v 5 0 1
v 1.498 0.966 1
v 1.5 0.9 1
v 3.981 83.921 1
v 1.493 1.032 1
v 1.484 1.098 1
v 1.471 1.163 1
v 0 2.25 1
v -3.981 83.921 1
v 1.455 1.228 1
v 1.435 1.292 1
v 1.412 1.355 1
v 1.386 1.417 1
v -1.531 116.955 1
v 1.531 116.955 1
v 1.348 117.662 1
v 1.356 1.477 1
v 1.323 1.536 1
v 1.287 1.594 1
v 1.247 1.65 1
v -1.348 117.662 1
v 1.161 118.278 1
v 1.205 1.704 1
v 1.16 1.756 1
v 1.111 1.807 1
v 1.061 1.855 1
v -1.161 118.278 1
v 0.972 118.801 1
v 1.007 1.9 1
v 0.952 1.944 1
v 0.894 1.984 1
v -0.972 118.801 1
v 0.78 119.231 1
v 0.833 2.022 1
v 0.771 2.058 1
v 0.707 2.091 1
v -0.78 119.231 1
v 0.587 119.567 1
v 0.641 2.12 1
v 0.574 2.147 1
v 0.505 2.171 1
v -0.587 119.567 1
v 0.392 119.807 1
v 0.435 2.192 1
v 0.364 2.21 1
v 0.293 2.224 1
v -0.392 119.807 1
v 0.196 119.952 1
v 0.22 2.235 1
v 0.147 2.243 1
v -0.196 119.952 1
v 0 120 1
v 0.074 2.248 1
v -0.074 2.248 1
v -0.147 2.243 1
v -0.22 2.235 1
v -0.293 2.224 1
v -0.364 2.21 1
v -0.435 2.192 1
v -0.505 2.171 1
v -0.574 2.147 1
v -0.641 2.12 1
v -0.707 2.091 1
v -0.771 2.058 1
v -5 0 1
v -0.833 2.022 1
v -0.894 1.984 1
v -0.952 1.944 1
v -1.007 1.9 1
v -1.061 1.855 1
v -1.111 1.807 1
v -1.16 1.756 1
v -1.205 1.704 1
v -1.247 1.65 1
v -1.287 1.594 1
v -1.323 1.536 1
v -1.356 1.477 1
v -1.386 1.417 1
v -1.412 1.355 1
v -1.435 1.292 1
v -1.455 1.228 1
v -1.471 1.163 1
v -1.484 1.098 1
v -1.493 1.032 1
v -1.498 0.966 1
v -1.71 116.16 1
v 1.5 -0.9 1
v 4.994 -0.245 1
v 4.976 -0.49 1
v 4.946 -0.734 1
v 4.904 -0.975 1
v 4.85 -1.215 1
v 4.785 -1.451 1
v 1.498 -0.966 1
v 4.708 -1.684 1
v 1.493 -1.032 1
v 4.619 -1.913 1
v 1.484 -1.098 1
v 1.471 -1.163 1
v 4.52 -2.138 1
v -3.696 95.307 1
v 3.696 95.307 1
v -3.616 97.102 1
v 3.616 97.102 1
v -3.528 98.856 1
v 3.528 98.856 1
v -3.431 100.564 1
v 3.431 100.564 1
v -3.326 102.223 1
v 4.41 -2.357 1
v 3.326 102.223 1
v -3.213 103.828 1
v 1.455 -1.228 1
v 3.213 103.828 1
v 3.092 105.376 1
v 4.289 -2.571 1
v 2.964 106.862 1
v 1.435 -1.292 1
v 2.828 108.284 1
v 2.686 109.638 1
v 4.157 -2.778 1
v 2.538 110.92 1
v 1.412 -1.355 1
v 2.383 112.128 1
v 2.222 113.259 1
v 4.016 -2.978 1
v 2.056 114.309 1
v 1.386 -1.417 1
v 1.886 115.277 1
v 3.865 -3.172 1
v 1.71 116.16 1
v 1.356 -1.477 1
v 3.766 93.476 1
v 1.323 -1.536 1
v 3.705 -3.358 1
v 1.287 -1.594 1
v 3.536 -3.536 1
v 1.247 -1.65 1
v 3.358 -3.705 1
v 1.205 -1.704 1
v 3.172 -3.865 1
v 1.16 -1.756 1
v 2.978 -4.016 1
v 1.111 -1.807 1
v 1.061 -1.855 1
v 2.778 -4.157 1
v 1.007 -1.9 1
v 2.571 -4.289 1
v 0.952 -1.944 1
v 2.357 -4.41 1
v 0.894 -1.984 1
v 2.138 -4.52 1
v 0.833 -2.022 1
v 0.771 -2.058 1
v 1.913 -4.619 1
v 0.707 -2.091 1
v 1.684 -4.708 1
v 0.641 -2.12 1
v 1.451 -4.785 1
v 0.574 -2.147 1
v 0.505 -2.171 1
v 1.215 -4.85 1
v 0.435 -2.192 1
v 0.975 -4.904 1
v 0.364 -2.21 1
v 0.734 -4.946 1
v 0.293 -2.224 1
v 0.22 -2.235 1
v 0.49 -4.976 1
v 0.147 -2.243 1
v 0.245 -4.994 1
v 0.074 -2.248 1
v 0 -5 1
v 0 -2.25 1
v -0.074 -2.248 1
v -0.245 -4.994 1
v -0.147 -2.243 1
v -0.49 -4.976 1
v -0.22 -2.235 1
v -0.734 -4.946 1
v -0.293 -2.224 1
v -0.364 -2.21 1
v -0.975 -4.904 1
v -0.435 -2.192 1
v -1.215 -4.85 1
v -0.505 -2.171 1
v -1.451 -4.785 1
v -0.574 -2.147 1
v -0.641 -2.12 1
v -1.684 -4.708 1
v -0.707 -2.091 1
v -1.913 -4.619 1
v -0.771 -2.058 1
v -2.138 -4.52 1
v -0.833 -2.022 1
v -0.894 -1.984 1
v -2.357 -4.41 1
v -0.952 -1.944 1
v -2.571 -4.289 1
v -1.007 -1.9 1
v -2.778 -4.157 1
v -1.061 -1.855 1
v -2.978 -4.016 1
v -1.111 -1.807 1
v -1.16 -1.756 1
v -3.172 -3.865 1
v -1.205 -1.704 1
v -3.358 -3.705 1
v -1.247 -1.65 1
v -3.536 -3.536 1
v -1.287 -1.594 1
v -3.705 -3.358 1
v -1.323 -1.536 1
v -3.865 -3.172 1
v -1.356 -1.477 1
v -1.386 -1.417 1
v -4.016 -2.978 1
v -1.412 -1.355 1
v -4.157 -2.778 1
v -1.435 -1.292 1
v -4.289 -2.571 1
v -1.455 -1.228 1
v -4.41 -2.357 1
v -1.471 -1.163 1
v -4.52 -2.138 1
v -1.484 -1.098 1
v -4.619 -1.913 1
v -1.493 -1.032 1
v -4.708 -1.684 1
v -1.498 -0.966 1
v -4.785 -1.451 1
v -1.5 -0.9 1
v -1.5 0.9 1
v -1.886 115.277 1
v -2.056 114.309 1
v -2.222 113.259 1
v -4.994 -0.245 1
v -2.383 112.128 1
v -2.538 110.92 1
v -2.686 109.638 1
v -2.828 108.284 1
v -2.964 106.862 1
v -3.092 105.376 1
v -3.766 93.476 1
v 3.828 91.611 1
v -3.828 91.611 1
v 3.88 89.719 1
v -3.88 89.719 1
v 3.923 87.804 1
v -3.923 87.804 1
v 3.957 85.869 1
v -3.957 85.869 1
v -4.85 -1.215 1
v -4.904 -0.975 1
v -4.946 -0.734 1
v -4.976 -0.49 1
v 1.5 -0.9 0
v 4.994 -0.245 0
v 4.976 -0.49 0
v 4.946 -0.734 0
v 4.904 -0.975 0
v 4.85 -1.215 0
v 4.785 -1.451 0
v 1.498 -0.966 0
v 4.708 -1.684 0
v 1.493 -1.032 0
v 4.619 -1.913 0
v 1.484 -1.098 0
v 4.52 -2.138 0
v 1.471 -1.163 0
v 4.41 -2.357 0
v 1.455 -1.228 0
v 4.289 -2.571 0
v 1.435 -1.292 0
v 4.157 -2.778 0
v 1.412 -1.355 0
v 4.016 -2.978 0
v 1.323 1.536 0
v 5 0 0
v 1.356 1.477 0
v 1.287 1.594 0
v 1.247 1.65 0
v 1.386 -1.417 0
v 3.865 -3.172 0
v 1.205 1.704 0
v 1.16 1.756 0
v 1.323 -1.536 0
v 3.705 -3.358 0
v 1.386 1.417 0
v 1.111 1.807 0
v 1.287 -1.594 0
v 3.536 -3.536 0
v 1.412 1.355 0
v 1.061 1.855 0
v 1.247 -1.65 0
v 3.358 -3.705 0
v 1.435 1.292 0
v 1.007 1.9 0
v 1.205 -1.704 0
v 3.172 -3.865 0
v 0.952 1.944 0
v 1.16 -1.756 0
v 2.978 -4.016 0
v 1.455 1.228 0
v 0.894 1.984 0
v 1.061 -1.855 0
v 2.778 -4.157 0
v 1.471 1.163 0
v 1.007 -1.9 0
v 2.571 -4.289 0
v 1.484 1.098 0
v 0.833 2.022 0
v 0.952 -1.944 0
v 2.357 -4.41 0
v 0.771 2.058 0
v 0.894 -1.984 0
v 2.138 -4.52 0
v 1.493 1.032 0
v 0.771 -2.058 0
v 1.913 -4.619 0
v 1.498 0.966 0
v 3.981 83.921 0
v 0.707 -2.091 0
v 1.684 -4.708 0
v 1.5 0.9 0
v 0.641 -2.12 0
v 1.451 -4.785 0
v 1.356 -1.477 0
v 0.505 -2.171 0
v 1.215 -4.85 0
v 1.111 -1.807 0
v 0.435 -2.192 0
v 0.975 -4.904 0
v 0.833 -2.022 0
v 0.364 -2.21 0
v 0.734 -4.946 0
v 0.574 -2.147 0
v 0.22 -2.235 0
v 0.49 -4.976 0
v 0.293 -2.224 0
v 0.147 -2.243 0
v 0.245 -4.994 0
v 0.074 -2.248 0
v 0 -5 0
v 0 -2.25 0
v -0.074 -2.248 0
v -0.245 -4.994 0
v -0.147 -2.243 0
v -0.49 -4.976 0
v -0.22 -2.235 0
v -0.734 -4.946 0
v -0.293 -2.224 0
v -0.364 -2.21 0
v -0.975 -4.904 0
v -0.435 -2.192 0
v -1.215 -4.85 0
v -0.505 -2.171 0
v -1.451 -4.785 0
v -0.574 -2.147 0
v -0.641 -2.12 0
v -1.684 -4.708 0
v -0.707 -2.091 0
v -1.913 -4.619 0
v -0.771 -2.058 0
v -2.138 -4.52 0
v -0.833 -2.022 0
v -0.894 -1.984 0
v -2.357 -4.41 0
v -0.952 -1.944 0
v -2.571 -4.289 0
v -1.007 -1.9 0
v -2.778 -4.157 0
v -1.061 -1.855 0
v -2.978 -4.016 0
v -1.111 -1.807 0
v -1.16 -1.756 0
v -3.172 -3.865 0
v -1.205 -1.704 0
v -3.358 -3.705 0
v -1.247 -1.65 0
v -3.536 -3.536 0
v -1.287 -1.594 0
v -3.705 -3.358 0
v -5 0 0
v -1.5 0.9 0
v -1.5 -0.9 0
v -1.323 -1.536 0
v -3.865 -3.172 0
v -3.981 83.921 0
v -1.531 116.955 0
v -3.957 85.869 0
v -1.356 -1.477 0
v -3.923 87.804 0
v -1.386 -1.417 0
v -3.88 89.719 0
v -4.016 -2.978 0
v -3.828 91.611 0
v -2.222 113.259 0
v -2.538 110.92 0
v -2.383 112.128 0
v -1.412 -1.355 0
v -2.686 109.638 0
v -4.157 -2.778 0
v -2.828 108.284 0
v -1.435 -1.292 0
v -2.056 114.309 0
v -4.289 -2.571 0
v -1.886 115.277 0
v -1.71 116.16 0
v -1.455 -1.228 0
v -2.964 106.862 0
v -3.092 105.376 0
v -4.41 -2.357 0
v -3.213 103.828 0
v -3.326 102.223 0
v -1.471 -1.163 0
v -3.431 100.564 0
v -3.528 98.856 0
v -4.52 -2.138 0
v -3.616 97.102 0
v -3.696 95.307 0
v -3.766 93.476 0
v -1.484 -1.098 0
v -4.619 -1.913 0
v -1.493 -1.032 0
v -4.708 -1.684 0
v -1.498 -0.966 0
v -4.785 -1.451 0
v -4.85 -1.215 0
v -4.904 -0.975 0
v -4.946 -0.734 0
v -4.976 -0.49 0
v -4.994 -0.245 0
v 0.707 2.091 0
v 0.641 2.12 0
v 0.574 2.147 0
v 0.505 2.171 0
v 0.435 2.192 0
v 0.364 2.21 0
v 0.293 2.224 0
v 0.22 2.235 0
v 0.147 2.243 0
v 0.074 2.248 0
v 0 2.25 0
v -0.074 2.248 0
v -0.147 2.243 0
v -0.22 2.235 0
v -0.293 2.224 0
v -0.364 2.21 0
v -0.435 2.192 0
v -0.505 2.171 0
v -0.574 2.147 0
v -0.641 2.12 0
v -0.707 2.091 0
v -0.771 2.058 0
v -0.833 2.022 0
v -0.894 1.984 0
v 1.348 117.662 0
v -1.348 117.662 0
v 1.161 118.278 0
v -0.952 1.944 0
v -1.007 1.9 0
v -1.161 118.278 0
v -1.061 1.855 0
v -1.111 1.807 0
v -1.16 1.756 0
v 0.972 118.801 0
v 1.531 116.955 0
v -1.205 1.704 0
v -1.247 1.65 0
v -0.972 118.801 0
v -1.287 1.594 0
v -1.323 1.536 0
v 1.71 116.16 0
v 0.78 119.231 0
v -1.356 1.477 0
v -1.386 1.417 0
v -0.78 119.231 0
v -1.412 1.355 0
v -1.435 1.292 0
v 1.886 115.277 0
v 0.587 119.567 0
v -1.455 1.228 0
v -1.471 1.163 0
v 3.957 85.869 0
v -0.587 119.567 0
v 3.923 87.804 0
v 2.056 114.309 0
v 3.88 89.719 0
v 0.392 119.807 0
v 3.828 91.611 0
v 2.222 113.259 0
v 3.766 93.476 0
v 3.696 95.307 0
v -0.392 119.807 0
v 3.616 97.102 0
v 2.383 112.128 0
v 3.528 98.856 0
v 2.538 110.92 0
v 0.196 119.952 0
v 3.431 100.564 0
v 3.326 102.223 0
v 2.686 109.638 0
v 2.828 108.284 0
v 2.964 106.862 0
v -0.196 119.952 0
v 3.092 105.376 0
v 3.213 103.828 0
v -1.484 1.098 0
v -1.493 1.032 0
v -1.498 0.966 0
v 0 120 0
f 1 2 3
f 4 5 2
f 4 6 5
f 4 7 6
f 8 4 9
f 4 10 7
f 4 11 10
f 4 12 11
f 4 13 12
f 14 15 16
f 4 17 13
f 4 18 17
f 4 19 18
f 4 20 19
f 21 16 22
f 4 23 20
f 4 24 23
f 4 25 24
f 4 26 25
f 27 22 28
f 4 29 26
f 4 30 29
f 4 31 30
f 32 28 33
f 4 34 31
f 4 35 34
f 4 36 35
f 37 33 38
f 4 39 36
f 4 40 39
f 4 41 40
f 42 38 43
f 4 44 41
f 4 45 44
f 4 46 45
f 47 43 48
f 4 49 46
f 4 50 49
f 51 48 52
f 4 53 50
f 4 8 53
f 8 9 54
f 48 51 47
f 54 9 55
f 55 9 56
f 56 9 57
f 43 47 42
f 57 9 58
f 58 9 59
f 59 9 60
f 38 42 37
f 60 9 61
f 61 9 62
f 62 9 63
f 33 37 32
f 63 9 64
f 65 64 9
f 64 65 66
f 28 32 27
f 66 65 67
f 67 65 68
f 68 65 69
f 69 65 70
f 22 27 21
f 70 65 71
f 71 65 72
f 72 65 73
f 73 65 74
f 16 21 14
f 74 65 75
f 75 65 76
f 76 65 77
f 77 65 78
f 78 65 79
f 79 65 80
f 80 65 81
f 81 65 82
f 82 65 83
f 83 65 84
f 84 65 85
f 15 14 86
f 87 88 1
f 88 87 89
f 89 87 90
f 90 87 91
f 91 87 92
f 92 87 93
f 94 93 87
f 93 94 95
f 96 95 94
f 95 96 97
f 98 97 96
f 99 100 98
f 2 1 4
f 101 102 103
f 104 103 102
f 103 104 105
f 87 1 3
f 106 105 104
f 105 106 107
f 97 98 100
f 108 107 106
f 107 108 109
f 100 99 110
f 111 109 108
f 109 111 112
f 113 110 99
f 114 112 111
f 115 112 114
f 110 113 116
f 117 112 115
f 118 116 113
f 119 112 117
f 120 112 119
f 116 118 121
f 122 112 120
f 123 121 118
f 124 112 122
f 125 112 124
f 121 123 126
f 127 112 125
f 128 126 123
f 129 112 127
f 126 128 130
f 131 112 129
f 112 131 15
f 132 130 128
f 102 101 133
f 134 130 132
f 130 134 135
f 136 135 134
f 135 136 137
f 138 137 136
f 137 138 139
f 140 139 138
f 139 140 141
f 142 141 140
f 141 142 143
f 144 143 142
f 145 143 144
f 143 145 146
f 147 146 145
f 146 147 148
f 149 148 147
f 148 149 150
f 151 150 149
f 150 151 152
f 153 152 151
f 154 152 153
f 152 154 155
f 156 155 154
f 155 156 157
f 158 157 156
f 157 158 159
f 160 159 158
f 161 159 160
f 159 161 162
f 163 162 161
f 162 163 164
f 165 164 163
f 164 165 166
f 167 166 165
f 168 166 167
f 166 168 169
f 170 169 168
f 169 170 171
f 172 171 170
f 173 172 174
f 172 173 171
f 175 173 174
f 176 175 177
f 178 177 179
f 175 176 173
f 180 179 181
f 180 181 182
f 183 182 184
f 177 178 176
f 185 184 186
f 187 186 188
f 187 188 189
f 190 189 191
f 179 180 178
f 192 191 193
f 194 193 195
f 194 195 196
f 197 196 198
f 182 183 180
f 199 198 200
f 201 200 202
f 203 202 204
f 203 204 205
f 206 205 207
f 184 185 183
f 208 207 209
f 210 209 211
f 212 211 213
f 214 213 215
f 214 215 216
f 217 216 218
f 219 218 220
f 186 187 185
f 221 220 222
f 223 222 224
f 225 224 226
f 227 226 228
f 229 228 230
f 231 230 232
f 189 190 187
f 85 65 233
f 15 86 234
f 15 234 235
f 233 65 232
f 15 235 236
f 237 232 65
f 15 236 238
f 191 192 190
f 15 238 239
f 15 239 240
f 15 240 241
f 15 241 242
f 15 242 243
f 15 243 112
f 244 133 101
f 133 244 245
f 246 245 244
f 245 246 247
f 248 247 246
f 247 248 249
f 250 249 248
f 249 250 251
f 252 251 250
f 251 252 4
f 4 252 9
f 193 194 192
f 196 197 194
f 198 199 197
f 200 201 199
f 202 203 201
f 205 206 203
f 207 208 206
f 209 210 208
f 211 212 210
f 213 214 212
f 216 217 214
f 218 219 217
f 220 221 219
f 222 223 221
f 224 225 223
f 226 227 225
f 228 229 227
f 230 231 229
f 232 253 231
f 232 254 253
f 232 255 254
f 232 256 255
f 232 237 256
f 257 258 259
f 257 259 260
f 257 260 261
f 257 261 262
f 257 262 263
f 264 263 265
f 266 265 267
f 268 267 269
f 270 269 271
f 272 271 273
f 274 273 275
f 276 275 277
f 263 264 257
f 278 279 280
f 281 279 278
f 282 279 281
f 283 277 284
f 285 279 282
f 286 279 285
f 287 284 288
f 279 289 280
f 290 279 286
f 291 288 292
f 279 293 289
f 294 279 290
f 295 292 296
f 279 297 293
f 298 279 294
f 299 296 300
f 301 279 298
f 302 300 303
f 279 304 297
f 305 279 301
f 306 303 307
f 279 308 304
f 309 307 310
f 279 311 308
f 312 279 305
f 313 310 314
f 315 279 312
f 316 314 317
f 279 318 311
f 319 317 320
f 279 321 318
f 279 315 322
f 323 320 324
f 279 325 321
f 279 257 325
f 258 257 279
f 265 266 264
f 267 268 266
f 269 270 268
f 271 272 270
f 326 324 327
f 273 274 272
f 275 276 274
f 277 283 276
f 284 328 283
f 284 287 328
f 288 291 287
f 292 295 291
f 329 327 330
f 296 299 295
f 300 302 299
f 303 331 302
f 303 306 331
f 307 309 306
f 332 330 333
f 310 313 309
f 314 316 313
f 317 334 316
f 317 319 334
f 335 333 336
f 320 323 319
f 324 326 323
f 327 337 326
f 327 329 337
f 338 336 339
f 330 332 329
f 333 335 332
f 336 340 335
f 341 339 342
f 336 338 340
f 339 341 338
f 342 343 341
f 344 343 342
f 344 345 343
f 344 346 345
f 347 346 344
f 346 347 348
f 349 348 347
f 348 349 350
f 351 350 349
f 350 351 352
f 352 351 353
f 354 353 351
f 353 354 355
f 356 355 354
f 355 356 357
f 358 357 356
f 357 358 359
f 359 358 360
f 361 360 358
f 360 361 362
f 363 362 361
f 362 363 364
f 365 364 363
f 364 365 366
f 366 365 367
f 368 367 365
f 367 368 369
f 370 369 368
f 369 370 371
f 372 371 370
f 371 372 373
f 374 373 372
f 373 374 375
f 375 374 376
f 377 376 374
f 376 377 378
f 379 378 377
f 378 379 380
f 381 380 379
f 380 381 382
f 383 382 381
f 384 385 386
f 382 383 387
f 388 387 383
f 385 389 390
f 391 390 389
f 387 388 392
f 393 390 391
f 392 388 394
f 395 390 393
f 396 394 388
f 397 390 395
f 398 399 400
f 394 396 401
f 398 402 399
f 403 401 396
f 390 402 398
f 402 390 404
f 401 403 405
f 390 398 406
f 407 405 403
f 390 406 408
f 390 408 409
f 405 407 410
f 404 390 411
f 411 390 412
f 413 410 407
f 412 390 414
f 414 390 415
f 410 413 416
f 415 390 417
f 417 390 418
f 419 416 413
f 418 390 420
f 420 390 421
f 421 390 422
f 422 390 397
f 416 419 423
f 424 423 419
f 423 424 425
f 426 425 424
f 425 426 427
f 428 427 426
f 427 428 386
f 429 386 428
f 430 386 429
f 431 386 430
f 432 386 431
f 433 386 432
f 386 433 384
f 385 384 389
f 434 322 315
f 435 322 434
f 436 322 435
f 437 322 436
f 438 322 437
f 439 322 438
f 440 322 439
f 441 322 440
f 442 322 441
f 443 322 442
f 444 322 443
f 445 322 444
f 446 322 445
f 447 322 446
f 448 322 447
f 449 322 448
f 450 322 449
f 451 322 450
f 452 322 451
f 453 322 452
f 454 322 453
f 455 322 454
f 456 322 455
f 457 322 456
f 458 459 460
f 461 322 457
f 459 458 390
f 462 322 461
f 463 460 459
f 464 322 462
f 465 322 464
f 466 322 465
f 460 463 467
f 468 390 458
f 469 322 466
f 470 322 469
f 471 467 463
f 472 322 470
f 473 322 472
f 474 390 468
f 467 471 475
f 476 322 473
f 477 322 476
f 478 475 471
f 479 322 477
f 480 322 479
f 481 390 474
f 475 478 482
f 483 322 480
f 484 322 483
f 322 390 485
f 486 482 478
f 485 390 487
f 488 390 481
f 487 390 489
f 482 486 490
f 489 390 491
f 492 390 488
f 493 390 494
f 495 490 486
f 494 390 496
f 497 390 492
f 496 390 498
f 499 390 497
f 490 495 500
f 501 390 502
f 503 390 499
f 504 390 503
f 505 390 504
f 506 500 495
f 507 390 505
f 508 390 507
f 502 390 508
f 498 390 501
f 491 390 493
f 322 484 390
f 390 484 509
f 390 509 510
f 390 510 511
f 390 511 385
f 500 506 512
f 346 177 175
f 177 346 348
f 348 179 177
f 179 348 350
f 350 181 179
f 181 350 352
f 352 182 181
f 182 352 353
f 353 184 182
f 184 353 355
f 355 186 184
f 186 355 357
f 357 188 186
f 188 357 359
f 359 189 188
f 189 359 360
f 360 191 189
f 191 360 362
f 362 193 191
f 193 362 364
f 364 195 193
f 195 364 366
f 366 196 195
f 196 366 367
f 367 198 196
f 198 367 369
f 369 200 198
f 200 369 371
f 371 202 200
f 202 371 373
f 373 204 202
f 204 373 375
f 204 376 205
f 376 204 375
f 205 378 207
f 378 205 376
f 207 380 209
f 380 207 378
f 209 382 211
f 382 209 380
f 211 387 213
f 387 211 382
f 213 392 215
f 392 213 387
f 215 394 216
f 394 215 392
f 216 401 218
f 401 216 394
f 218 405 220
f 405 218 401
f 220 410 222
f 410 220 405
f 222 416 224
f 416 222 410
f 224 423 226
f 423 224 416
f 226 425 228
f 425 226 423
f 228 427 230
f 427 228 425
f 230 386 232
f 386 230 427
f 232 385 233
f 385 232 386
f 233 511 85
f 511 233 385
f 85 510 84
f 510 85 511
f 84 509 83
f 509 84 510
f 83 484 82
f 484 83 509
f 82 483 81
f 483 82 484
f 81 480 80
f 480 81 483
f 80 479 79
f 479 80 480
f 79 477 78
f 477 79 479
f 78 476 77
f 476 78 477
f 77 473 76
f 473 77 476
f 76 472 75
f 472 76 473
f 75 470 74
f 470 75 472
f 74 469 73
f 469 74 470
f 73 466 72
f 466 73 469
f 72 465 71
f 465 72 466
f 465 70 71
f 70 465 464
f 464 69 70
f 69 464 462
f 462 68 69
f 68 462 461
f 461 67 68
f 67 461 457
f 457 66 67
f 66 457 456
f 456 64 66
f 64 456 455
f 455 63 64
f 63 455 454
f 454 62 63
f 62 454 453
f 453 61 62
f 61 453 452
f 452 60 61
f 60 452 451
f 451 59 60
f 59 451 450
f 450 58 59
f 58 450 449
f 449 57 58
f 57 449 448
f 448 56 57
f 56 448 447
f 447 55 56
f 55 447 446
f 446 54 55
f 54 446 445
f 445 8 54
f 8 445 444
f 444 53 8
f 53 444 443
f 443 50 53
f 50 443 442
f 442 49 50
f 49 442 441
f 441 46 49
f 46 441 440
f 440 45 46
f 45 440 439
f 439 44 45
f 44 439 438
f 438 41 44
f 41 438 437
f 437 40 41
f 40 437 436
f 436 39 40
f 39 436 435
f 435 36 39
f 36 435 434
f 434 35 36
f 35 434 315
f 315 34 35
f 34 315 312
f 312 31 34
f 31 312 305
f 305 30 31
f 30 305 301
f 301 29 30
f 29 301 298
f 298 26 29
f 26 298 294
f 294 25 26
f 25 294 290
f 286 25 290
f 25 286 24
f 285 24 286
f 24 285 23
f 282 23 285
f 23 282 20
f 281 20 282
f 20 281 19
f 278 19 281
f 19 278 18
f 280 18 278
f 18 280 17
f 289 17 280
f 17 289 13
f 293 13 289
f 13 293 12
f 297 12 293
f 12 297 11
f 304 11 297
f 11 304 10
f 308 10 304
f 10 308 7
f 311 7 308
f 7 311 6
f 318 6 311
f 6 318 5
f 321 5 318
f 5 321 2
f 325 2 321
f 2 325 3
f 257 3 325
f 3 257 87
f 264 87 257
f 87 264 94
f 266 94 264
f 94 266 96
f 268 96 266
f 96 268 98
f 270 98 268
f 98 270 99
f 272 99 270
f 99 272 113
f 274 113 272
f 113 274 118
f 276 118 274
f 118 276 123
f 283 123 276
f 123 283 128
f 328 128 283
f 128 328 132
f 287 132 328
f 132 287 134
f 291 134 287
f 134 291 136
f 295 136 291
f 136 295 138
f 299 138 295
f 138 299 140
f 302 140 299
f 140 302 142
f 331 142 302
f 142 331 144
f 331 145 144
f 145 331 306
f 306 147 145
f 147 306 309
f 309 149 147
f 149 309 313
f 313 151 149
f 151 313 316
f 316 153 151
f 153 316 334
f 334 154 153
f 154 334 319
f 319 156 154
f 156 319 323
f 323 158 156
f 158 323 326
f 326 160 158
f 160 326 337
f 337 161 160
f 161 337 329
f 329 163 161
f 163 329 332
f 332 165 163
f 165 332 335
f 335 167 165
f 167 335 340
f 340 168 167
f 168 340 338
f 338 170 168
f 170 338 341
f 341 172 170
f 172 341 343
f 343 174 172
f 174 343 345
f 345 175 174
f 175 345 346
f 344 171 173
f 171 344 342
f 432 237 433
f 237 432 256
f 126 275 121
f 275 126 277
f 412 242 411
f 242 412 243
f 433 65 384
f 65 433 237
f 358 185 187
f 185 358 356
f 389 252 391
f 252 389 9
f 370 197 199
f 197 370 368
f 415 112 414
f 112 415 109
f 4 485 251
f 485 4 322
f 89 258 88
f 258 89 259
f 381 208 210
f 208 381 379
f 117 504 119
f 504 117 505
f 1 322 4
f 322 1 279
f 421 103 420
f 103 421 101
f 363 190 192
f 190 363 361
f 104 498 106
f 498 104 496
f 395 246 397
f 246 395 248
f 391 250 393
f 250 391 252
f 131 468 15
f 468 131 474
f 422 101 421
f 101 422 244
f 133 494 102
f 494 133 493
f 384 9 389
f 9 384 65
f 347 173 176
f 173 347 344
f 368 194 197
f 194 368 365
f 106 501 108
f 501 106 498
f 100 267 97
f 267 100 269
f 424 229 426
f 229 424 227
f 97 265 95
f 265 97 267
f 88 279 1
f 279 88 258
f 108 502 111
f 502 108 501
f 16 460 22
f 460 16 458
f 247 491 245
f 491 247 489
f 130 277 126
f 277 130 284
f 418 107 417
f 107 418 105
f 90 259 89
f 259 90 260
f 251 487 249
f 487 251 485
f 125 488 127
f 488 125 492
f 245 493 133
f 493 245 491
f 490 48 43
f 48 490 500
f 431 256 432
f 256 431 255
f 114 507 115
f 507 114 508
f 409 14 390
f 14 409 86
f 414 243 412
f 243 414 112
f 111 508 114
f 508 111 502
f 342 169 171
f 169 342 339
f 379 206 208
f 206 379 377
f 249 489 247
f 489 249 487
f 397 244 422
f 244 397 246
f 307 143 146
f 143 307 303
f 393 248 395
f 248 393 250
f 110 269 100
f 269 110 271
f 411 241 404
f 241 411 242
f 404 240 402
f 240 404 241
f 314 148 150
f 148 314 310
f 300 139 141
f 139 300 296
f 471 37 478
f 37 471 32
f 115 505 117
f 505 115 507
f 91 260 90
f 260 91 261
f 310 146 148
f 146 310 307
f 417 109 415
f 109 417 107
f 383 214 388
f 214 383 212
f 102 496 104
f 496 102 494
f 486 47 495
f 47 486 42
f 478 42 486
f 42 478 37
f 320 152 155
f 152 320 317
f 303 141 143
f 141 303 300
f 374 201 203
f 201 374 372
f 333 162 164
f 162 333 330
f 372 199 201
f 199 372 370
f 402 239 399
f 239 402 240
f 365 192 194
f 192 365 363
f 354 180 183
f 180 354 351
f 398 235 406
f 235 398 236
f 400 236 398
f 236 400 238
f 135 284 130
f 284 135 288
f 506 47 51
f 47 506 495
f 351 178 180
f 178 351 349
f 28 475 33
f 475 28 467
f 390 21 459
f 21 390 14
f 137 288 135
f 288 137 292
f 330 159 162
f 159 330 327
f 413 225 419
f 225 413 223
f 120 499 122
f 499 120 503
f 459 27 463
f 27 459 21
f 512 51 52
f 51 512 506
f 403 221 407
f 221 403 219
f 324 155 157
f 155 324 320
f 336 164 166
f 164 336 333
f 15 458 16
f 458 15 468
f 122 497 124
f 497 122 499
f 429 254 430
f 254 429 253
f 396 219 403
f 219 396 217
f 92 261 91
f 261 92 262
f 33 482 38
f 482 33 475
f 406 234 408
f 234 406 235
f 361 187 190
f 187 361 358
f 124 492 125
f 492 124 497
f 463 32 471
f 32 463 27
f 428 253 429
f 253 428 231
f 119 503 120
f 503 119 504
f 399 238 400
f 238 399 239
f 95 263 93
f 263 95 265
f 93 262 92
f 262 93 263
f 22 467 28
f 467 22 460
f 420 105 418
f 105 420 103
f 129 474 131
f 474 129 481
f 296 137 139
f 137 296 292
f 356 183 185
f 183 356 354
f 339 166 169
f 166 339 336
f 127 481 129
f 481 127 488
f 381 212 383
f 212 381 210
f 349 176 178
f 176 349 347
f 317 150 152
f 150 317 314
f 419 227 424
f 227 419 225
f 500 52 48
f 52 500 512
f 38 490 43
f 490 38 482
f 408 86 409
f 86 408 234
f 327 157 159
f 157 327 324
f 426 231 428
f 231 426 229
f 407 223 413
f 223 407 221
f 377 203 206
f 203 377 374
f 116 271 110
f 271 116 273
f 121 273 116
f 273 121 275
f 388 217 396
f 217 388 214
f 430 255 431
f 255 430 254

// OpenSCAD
$fn= 128*1;

// Length of clock hand in mm
length = 120; // [10:200]
// Minutes or hours clock hand
clockhandType = "minutes"; // ["minutes", "hours"]

module streched_circle(d, s) {
    //d is diameter of circle, s is length of the part in the middle
    hull() {
        translate([0, -s/2, 0]) half_circle(d);
        rotate([0,0,180]) translate([0,-s/2,0]) half_circle(d);
    }
}

module half_circle(d) {
        difference() {
        scale([1,0.9, 1]) circle(d=d);
        translate([0,d/2,0]) square(size=d, center=true);
    }
}



module hole_shape_hours() {
    //shape of the hole of the clock hand for hours
    difference() {
        circle(d=10);
        circle(d=5.2);
    }
}

module hole_shape_minutes() {
    //minutes clock hand
    difference() {
        streched_circle(6, 4);
        streched_circle(3, 1.8);
    }
}


module pointer(h, length) {
    d=8;
    yf = length/(1.5*d);

    difference() {
        linear_extrude(h) {
            hull() {
                translate([0,d*yf,0]) scale([1, yf, 5]) circle(d=d);
                    scale([1, 1, 5]) circle(d=d+2);
                }
        }

    difference() {
        hull() {
            linear_extrude(h) children();
            }
        linear_extrude(h) children(); 
    }

    }

}

if (clockhandType == "minutes") {
    pointer(h=1, length=length) {hole_shape_minutes();}
}

if (clockhandType == "hours") {
    pointer(h=2, length=length) {hole_shape_hours();}
 }
